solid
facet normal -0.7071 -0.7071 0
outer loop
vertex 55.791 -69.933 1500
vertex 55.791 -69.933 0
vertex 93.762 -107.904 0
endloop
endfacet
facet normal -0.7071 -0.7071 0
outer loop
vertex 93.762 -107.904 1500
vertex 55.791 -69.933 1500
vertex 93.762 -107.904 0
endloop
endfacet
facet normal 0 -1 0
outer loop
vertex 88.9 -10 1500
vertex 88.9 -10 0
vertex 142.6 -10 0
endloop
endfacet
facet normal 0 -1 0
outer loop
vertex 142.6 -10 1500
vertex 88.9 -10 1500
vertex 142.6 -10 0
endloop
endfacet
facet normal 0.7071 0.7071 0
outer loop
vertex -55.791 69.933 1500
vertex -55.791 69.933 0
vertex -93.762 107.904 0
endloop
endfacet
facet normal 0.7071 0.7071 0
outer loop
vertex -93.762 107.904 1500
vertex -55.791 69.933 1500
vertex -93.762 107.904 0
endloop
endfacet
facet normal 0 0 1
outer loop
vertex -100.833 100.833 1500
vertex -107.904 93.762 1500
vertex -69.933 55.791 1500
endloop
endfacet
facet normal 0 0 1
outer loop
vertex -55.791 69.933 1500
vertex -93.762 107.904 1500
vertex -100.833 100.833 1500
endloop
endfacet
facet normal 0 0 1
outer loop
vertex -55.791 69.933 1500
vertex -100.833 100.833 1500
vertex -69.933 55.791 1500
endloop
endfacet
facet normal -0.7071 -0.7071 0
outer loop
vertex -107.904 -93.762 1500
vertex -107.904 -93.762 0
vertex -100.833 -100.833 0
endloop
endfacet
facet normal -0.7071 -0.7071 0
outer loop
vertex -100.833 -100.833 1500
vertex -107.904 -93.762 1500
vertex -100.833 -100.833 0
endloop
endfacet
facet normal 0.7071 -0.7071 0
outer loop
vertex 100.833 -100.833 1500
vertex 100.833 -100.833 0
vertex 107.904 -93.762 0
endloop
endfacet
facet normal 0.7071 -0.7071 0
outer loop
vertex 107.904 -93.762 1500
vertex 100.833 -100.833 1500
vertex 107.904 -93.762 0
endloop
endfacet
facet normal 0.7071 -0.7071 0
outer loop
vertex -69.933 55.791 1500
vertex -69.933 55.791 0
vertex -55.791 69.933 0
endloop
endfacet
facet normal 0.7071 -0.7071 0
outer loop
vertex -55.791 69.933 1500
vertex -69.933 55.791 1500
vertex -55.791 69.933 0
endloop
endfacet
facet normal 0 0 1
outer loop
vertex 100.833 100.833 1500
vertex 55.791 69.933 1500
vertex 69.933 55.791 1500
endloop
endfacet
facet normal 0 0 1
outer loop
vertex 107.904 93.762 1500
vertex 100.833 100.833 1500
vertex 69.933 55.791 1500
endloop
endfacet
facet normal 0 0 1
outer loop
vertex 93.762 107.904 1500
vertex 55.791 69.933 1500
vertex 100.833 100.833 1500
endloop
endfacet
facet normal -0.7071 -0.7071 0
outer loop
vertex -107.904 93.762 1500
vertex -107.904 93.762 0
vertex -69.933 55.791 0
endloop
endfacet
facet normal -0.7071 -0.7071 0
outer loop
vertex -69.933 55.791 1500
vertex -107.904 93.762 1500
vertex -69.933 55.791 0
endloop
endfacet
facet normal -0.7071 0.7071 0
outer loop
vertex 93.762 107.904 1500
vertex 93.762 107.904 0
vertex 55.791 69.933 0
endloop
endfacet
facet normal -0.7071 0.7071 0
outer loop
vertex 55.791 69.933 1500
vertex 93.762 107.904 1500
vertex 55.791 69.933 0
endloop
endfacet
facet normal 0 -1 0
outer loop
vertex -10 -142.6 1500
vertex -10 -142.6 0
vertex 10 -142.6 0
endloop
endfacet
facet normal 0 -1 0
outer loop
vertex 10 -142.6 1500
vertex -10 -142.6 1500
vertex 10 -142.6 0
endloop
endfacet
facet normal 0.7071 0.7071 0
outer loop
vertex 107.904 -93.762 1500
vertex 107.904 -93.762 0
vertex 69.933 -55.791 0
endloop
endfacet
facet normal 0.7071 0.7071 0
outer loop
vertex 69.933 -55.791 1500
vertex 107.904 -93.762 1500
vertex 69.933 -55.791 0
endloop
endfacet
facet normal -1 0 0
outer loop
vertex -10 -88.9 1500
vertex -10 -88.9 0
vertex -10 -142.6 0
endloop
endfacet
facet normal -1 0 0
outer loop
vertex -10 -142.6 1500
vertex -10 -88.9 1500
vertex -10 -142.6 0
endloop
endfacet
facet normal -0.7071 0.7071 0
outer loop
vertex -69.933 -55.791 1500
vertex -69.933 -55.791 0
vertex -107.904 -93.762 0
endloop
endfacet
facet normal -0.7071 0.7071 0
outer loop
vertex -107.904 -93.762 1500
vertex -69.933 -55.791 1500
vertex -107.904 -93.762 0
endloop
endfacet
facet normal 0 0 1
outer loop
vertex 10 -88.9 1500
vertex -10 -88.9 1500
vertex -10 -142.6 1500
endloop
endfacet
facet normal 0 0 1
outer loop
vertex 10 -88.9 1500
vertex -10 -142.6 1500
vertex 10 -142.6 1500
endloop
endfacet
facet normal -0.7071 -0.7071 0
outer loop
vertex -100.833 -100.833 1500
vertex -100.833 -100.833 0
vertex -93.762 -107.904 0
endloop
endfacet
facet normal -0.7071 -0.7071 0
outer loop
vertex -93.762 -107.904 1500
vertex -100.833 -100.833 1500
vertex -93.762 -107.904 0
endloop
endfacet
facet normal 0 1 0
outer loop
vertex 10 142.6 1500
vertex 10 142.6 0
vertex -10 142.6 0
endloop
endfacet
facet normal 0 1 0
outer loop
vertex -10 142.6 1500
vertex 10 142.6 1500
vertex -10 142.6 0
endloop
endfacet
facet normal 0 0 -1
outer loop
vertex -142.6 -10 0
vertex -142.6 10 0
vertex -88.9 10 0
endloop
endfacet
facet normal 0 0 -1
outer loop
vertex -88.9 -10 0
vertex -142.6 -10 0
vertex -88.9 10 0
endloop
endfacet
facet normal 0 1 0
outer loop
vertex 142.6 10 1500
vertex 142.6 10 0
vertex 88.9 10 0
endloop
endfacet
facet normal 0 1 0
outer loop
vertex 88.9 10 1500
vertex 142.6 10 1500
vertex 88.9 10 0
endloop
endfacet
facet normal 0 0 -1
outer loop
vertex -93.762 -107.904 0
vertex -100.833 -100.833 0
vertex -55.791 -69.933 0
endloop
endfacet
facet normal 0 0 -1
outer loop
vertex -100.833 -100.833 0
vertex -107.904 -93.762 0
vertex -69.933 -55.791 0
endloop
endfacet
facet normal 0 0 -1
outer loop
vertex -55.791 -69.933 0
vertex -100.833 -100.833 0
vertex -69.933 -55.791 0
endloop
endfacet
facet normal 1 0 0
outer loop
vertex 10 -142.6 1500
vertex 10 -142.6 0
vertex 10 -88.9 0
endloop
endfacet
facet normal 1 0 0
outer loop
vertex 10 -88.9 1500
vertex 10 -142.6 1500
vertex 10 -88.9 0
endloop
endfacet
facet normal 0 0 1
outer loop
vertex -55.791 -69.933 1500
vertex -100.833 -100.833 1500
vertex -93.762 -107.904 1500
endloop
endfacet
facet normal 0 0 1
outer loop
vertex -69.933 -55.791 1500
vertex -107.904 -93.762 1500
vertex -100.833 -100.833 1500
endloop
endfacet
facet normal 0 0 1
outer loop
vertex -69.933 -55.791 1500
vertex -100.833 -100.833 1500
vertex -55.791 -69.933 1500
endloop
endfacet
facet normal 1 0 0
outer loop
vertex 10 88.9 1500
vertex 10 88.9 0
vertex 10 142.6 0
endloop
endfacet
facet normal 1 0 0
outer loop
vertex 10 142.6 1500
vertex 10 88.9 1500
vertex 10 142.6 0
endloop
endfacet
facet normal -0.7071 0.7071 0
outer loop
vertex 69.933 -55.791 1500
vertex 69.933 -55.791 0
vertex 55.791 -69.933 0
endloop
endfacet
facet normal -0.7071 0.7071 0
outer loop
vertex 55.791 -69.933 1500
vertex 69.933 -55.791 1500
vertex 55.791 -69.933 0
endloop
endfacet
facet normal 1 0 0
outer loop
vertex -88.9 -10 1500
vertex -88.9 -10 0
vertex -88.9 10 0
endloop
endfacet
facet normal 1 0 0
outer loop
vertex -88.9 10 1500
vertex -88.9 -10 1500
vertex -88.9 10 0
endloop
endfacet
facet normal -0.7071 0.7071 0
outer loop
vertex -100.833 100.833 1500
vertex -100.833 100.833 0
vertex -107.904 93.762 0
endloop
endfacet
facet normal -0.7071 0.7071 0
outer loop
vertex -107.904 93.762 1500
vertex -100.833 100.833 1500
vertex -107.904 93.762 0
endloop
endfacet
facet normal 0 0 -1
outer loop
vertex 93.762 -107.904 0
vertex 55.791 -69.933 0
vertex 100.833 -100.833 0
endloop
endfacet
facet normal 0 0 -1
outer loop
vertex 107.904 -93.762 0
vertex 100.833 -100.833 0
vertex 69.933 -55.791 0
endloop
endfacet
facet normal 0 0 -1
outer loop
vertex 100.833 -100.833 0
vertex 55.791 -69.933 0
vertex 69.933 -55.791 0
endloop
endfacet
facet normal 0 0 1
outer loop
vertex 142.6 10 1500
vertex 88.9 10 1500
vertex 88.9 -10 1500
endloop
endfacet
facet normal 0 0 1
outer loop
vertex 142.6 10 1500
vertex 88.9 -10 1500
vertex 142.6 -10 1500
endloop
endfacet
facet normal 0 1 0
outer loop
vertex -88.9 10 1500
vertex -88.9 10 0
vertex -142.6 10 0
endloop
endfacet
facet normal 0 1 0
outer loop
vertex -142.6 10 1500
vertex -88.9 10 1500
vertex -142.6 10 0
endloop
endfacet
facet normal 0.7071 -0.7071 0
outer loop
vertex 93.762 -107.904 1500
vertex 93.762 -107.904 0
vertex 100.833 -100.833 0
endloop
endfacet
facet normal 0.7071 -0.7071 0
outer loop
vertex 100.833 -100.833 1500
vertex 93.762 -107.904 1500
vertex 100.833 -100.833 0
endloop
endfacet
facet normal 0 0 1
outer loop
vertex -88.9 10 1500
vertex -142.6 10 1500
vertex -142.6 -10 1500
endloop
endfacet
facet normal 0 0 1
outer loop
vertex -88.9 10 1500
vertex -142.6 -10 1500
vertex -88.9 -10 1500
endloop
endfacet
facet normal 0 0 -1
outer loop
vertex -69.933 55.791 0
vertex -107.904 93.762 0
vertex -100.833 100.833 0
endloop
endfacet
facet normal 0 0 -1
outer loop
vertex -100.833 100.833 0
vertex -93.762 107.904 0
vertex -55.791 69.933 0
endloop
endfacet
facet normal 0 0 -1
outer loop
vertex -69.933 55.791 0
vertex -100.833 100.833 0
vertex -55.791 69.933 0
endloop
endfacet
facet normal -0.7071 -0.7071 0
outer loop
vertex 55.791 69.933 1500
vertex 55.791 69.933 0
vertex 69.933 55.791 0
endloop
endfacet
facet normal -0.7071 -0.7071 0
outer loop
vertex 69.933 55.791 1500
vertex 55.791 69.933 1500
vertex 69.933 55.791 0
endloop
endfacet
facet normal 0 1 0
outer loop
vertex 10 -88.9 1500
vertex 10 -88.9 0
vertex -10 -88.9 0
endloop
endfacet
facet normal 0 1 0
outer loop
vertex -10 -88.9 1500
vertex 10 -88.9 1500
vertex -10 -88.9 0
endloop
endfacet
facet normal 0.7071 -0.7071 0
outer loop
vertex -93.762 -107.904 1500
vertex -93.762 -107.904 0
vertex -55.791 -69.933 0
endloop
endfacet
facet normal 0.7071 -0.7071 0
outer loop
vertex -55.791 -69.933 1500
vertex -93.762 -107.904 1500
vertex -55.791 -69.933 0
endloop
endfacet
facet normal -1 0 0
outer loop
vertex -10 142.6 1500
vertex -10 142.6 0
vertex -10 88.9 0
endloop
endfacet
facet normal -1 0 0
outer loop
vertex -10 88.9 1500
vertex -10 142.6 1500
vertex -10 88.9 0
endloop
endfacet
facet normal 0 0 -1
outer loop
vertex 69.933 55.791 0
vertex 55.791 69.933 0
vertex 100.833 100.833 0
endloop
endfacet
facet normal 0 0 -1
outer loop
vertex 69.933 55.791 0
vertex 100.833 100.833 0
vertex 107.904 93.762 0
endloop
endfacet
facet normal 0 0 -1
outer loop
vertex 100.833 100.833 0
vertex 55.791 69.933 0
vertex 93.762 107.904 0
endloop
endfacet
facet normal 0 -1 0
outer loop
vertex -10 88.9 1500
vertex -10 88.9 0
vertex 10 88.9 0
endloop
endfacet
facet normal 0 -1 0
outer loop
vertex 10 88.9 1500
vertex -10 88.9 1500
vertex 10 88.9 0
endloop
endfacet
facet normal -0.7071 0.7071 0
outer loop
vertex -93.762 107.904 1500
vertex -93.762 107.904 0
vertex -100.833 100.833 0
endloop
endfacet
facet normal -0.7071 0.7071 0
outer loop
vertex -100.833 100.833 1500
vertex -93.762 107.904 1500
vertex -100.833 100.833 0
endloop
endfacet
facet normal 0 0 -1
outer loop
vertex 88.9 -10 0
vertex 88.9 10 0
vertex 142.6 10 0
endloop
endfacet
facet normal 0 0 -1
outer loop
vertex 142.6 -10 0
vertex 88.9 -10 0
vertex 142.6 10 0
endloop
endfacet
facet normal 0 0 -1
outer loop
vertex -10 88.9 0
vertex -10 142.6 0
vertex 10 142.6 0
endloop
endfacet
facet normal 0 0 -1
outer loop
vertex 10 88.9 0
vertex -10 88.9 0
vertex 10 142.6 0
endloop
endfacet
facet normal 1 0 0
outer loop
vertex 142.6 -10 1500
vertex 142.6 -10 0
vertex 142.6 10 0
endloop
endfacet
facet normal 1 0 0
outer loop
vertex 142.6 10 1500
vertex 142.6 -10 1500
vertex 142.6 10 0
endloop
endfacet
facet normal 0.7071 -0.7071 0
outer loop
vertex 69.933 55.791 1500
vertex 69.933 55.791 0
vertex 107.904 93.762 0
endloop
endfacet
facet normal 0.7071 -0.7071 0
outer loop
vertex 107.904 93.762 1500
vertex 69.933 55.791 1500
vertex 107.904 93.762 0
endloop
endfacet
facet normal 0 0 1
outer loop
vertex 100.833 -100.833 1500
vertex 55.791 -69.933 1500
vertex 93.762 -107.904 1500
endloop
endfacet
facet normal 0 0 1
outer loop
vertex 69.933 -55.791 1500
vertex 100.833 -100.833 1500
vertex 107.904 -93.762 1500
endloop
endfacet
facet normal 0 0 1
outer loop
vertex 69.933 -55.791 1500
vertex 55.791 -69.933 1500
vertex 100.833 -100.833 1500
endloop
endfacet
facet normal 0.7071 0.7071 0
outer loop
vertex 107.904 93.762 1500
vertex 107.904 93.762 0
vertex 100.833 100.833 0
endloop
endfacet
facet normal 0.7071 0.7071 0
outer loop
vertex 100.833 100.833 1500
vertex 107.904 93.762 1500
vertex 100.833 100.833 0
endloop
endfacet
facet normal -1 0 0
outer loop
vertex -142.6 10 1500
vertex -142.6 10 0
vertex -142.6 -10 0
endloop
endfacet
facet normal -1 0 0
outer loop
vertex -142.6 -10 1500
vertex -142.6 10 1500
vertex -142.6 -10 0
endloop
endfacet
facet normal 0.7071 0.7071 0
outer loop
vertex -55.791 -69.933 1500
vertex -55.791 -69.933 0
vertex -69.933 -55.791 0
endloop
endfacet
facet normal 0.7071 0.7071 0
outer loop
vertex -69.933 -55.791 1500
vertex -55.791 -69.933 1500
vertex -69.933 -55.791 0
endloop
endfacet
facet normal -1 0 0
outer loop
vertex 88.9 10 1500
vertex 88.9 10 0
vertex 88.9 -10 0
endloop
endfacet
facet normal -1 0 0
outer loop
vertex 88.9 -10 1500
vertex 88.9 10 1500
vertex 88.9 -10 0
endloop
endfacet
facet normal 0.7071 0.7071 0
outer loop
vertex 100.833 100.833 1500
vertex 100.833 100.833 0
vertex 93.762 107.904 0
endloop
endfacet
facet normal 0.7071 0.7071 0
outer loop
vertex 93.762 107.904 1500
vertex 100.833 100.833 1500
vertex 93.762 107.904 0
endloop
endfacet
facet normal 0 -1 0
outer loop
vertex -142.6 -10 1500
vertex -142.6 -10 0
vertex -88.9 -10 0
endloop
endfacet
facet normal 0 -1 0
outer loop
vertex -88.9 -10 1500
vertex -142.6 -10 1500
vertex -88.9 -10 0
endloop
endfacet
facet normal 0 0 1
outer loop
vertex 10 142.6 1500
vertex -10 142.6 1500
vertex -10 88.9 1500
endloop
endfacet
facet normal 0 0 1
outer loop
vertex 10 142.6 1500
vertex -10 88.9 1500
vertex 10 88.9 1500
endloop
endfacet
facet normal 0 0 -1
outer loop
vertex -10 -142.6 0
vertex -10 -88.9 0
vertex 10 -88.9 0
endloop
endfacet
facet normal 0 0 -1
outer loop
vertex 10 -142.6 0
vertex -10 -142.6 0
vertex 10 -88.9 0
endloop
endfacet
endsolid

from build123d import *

# Parameters (mm, degrees)
F1_DEPTH = 1500


with BuildPart() as f1:
    # F0 (on Top) → F1 (new body)
    with BuildSketch(Plane.XY):
        Polygon((10, 88.9), (10, 142.599798), (0, 142.599798), (-10, 142.599798), (-10, 88.9), (0, 88.9), align=None)
        Polygon((69.932861, 55.790725), (107.904352, 93.762217), (100.833284, 100.833284), (93.762217, 107.904352), (55.790725, 69.932861), (62.861793, 62.861793), align=None)
        Polygon((142.599798, 0), (142.599798, 10), (88.9, 10), (88.9, 0), (88.9, -10), (142.599798, -10), align=None)
        Polygon((100.833284, -100.833284), (107.904352, -93.762217), (69.932861, -55.790725), (62.861793, -62.861793), (55.790725, -69.932861), (93.762217, -107.904352), align=None)
        Polygon((0, -142.599798), (10, -142.599798), (10, -88.9), (0, -88.9), (-10, -88.9), (-10, -142.599798), align=None)
        Polygon((-55.790725, 69.932861), (-93.762217, 107.904352), (-100.833284, 100.833284), (-107.904352, 93.762217), (-69.932861, 55.790725), (-62.861793, 62.861793), align=None)
        Polygon((-88.9, -10), (-88.9, 0), (-88.9, 10), (-142.599798, 10), (-142.599798, 0), (-142.599798, -10), align=None)
        Polygon((-55.790725, -69.932861), (-62.861793, -62.861793), (-69.932861, -55.790725), (-107.904352, -93.762217), (-100.833284, -100.833284), (-93.762217, -107.904352), align=None)
    extrude(amount=F1_DEPTH)


solid = f1.part
